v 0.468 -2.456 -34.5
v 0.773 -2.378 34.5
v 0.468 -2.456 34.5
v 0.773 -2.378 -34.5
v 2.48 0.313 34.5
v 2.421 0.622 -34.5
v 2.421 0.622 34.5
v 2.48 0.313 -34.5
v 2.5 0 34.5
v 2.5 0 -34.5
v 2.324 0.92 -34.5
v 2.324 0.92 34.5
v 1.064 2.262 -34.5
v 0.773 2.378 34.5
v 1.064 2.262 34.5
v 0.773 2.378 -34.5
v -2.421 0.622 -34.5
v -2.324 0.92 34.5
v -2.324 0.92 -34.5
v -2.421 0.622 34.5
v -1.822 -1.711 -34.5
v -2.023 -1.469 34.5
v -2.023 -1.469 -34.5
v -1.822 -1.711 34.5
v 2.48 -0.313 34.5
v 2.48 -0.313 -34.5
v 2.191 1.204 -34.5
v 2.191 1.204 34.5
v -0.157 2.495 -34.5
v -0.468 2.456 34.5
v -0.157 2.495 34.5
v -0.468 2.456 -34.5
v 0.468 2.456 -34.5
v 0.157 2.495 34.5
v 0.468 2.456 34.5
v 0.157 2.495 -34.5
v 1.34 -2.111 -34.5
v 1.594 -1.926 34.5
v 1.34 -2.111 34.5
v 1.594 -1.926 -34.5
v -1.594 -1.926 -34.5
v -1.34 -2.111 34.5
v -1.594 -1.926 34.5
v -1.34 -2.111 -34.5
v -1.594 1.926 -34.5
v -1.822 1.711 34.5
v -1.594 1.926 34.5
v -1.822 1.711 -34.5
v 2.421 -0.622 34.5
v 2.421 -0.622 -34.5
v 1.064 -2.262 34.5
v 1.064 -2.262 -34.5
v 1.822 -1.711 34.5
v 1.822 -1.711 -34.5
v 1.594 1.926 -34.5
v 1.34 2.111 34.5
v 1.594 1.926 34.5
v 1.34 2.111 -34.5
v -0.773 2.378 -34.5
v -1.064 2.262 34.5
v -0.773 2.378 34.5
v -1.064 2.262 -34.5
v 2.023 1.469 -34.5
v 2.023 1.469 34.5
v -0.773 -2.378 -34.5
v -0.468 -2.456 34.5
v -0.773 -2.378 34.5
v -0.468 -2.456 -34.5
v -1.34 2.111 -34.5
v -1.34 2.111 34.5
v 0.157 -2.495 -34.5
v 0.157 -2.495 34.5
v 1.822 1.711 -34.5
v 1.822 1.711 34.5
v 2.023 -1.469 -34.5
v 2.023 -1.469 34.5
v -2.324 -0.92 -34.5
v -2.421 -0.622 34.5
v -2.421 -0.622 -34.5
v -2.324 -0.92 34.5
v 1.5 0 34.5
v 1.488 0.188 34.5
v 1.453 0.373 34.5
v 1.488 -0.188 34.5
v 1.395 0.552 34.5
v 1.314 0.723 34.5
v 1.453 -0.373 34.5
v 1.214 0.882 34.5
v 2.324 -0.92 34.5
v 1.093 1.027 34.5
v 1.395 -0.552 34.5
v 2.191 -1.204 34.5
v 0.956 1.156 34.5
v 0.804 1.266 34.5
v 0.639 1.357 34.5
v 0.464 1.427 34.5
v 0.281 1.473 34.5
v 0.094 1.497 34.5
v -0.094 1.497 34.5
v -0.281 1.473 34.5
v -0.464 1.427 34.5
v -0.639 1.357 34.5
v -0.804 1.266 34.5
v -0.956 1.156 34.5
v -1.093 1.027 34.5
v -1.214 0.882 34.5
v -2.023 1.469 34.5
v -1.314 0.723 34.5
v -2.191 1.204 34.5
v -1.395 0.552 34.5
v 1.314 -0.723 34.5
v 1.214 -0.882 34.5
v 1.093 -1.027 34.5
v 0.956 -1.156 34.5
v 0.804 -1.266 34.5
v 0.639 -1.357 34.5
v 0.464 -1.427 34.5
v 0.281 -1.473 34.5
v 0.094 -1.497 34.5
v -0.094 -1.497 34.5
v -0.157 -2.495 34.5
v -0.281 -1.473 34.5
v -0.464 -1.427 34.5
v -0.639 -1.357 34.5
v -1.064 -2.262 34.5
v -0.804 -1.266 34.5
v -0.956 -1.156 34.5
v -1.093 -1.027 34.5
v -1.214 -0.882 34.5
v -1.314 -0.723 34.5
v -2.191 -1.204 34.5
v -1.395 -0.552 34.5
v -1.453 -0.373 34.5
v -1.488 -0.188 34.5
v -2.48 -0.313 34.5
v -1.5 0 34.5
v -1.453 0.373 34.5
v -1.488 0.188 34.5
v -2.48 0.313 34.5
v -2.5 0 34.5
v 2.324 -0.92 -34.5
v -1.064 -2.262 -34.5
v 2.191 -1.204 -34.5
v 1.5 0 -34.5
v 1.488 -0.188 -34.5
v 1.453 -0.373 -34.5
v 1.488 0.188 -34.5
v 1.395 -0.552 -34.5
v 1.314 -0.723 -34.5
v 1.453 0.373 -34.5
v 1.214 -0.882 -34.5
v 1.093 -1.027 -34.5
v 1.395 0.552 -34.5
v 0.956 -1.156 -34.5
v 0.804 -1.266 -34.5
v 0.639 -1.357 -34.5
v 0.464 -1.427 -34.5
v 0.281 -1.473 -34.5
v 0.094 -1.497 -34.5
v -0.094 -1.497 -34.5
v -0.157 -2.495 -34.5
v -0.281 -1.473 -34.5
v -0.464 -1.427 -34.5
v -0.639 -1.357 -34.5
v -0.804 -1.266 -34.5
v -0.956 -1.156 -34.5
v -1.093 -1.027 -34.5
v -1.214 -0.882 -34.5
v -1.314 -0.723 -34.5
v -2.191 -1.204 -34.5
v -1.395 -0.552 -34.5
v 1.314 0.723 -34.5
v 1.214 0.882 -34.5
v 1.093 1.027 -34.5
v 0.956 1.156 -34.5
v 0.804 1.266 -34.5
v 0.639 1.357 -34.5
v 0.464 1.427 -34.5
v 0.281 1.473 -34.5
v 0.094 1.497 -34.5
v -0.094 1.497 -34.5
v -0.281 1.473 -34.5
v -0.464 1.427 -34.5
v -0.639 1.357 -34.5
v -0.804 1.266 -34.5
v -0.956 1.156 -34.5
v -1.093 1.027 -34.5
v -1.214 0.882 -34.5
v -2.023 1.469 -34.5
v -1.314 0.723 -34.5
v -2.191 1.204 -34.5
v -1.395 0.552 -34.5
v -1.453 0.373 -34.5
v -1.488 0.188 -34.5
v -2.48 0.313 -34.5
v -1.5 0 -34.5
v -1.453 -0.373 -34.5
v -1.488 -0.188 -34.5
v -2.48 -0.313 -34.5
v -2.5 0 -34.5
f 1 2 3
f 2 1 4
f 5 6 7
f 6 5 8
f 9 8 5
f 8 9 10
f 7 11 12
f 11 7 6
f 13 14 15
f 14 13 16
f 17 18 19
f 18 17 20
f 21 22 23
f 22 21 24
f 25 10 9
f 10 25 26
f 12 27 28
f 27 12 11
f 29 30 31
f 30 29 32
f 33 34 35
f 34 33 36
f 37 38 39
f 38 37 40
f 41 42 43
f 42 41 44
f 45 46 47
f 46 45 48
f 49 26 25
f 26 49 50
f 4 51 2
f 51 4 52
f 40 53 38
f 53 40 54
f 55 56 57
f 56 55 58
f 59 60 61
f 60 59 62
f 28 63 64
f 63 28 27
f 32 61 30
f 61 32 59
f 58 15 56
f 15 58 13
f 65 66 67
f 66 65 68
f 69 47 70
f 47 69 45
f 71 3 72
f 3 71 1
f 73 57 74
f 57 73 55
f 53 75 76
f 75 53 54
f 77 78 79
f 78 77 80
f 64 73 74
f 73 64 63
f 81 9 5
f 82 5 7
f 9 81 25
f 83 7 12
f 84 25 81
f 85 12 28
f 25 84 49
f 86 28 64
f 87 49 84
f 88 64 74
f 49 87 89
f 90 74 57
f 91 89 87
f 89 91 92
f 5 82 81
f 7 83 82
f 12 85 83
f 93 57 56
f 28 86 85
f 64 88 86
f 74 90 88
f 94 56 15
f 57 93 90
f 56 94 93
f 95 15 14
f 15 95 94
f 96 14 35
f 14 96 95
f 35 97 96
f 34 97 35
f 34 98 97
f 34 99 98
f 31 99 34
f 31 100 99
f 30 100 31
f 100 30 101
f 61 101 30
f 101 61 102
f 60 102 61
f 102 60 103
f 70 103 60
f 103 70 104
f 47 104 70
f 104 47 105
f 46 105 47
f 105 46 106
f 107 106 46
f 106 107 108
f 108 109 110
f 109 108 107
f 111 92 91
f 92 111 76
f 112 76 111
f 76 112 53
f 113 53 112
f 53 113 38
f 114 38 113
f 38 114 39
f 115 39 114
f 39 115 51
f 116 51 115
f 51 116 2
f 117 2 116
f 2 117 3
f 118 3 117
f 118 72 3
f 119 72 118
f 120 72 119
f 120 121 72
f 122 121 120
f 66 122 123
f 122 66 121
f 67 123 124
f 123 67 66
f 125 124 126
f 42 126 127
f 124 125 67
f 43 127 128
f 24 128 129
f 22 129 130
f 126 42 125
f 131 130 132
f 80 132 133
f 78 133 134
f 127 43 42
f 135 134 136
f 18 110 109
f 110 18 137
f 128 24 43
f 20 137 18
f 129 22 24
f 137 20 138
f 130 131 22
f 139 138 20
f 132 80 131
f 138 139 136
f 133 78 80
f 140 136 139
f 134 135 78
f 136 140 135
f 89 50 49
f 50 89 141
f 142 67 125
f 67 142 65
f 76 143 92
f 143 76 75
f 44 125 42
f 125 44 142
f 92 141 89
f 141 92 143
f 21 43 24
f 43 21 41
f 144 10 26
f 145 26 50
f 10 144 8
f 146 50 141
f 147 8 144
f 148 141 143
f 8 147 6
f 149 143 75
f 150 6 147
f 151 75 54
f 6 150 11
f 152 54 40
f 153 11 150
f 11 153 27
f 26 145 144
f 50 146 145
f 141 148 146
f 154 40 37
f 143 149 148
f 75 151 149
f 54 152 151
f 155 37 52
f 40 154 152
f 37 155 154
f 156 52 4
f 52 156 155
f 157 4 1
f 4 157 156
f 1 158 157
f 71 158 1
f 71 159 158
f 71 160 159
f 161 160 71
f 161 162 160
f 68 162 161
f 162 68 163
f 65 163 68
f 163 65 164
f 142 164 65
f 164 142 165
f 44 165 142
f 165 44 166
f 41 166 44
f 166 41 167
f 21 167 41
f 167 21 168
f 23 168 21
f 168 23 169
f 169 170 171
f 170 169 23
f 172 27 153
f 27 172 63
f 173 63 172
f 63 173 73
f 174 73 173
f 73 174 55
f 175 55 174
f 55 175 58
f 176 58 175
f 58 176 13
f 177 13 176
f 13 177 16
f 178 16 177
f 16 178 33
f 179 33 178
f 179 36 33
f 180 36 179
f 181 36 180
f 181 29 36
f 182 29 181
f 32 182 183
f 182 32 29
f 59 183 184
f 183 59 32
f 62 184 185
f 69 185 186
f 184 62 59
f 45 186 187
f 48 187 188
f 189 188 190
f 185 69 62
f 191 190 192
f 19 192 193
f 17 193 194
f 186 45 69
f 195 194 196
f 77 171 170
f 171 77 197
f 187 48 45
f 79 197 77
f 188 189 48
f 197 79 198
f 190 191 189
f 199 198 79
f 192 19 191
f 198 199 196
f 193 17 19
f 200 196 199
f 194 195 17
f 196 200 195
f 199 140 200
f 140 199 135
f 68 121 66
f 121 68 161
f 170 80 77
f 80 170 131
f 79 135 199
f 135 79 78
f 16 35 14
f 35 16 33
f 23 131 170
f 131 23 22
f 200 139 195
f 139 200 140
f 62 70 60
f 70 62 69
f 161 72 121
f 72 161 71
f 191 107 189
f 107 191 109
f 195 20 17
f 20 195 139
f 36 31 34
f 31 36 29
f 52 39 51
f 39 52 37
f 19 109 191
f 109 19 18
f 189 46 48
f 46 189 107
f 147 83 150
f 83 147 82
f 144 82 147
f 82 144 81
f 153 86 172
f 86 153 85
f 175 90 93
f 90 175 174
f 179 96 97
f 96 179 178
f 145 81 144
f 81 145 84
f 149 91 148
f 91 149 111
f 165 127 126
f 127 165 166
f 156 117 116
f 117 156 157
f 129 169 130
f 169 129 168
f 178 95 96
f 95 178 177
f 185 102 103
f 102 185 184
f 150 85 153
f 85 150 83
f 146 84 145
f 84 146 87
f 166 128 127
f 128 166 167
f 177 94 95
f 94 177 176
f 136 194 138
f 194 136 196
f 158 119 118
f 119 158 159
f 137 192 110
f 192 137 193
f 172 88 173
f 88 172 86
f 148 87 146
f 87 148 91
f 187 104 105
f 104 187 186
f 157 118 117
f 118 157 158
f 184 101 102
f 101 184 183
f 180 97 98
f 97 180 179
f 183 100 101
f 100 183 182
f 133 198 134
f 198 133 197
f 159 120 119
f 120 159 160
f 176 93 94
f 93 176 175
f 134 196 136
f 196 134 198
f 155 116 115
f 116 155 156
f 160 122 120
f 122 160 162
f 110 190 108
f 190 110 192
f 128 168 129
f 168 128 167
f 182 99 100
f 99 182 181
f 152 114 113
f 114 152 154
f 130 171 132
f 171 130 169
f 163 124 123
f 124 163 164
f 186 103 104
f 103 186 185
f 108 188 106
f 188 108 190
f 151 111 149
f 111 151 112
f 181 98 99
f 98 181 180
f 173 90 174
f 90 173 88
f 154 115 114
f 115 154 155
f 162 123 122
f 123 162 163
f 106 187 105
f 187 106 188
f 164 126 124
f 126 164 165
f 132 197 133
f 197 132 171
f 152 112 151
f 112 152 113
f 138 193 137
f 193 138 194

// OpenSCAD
$fn = 50;


difference() {
	union() {
		translate(v = [0, 0, -34.5000000000]) {
			cylinder(h = 69, r = 2.5000000000);
		}
	}
	union() {
		translate(v = [0, 0, -100.0000000000]) {
			cylinder(h = 200, r = 1.5000000000);
		}
	}
}
